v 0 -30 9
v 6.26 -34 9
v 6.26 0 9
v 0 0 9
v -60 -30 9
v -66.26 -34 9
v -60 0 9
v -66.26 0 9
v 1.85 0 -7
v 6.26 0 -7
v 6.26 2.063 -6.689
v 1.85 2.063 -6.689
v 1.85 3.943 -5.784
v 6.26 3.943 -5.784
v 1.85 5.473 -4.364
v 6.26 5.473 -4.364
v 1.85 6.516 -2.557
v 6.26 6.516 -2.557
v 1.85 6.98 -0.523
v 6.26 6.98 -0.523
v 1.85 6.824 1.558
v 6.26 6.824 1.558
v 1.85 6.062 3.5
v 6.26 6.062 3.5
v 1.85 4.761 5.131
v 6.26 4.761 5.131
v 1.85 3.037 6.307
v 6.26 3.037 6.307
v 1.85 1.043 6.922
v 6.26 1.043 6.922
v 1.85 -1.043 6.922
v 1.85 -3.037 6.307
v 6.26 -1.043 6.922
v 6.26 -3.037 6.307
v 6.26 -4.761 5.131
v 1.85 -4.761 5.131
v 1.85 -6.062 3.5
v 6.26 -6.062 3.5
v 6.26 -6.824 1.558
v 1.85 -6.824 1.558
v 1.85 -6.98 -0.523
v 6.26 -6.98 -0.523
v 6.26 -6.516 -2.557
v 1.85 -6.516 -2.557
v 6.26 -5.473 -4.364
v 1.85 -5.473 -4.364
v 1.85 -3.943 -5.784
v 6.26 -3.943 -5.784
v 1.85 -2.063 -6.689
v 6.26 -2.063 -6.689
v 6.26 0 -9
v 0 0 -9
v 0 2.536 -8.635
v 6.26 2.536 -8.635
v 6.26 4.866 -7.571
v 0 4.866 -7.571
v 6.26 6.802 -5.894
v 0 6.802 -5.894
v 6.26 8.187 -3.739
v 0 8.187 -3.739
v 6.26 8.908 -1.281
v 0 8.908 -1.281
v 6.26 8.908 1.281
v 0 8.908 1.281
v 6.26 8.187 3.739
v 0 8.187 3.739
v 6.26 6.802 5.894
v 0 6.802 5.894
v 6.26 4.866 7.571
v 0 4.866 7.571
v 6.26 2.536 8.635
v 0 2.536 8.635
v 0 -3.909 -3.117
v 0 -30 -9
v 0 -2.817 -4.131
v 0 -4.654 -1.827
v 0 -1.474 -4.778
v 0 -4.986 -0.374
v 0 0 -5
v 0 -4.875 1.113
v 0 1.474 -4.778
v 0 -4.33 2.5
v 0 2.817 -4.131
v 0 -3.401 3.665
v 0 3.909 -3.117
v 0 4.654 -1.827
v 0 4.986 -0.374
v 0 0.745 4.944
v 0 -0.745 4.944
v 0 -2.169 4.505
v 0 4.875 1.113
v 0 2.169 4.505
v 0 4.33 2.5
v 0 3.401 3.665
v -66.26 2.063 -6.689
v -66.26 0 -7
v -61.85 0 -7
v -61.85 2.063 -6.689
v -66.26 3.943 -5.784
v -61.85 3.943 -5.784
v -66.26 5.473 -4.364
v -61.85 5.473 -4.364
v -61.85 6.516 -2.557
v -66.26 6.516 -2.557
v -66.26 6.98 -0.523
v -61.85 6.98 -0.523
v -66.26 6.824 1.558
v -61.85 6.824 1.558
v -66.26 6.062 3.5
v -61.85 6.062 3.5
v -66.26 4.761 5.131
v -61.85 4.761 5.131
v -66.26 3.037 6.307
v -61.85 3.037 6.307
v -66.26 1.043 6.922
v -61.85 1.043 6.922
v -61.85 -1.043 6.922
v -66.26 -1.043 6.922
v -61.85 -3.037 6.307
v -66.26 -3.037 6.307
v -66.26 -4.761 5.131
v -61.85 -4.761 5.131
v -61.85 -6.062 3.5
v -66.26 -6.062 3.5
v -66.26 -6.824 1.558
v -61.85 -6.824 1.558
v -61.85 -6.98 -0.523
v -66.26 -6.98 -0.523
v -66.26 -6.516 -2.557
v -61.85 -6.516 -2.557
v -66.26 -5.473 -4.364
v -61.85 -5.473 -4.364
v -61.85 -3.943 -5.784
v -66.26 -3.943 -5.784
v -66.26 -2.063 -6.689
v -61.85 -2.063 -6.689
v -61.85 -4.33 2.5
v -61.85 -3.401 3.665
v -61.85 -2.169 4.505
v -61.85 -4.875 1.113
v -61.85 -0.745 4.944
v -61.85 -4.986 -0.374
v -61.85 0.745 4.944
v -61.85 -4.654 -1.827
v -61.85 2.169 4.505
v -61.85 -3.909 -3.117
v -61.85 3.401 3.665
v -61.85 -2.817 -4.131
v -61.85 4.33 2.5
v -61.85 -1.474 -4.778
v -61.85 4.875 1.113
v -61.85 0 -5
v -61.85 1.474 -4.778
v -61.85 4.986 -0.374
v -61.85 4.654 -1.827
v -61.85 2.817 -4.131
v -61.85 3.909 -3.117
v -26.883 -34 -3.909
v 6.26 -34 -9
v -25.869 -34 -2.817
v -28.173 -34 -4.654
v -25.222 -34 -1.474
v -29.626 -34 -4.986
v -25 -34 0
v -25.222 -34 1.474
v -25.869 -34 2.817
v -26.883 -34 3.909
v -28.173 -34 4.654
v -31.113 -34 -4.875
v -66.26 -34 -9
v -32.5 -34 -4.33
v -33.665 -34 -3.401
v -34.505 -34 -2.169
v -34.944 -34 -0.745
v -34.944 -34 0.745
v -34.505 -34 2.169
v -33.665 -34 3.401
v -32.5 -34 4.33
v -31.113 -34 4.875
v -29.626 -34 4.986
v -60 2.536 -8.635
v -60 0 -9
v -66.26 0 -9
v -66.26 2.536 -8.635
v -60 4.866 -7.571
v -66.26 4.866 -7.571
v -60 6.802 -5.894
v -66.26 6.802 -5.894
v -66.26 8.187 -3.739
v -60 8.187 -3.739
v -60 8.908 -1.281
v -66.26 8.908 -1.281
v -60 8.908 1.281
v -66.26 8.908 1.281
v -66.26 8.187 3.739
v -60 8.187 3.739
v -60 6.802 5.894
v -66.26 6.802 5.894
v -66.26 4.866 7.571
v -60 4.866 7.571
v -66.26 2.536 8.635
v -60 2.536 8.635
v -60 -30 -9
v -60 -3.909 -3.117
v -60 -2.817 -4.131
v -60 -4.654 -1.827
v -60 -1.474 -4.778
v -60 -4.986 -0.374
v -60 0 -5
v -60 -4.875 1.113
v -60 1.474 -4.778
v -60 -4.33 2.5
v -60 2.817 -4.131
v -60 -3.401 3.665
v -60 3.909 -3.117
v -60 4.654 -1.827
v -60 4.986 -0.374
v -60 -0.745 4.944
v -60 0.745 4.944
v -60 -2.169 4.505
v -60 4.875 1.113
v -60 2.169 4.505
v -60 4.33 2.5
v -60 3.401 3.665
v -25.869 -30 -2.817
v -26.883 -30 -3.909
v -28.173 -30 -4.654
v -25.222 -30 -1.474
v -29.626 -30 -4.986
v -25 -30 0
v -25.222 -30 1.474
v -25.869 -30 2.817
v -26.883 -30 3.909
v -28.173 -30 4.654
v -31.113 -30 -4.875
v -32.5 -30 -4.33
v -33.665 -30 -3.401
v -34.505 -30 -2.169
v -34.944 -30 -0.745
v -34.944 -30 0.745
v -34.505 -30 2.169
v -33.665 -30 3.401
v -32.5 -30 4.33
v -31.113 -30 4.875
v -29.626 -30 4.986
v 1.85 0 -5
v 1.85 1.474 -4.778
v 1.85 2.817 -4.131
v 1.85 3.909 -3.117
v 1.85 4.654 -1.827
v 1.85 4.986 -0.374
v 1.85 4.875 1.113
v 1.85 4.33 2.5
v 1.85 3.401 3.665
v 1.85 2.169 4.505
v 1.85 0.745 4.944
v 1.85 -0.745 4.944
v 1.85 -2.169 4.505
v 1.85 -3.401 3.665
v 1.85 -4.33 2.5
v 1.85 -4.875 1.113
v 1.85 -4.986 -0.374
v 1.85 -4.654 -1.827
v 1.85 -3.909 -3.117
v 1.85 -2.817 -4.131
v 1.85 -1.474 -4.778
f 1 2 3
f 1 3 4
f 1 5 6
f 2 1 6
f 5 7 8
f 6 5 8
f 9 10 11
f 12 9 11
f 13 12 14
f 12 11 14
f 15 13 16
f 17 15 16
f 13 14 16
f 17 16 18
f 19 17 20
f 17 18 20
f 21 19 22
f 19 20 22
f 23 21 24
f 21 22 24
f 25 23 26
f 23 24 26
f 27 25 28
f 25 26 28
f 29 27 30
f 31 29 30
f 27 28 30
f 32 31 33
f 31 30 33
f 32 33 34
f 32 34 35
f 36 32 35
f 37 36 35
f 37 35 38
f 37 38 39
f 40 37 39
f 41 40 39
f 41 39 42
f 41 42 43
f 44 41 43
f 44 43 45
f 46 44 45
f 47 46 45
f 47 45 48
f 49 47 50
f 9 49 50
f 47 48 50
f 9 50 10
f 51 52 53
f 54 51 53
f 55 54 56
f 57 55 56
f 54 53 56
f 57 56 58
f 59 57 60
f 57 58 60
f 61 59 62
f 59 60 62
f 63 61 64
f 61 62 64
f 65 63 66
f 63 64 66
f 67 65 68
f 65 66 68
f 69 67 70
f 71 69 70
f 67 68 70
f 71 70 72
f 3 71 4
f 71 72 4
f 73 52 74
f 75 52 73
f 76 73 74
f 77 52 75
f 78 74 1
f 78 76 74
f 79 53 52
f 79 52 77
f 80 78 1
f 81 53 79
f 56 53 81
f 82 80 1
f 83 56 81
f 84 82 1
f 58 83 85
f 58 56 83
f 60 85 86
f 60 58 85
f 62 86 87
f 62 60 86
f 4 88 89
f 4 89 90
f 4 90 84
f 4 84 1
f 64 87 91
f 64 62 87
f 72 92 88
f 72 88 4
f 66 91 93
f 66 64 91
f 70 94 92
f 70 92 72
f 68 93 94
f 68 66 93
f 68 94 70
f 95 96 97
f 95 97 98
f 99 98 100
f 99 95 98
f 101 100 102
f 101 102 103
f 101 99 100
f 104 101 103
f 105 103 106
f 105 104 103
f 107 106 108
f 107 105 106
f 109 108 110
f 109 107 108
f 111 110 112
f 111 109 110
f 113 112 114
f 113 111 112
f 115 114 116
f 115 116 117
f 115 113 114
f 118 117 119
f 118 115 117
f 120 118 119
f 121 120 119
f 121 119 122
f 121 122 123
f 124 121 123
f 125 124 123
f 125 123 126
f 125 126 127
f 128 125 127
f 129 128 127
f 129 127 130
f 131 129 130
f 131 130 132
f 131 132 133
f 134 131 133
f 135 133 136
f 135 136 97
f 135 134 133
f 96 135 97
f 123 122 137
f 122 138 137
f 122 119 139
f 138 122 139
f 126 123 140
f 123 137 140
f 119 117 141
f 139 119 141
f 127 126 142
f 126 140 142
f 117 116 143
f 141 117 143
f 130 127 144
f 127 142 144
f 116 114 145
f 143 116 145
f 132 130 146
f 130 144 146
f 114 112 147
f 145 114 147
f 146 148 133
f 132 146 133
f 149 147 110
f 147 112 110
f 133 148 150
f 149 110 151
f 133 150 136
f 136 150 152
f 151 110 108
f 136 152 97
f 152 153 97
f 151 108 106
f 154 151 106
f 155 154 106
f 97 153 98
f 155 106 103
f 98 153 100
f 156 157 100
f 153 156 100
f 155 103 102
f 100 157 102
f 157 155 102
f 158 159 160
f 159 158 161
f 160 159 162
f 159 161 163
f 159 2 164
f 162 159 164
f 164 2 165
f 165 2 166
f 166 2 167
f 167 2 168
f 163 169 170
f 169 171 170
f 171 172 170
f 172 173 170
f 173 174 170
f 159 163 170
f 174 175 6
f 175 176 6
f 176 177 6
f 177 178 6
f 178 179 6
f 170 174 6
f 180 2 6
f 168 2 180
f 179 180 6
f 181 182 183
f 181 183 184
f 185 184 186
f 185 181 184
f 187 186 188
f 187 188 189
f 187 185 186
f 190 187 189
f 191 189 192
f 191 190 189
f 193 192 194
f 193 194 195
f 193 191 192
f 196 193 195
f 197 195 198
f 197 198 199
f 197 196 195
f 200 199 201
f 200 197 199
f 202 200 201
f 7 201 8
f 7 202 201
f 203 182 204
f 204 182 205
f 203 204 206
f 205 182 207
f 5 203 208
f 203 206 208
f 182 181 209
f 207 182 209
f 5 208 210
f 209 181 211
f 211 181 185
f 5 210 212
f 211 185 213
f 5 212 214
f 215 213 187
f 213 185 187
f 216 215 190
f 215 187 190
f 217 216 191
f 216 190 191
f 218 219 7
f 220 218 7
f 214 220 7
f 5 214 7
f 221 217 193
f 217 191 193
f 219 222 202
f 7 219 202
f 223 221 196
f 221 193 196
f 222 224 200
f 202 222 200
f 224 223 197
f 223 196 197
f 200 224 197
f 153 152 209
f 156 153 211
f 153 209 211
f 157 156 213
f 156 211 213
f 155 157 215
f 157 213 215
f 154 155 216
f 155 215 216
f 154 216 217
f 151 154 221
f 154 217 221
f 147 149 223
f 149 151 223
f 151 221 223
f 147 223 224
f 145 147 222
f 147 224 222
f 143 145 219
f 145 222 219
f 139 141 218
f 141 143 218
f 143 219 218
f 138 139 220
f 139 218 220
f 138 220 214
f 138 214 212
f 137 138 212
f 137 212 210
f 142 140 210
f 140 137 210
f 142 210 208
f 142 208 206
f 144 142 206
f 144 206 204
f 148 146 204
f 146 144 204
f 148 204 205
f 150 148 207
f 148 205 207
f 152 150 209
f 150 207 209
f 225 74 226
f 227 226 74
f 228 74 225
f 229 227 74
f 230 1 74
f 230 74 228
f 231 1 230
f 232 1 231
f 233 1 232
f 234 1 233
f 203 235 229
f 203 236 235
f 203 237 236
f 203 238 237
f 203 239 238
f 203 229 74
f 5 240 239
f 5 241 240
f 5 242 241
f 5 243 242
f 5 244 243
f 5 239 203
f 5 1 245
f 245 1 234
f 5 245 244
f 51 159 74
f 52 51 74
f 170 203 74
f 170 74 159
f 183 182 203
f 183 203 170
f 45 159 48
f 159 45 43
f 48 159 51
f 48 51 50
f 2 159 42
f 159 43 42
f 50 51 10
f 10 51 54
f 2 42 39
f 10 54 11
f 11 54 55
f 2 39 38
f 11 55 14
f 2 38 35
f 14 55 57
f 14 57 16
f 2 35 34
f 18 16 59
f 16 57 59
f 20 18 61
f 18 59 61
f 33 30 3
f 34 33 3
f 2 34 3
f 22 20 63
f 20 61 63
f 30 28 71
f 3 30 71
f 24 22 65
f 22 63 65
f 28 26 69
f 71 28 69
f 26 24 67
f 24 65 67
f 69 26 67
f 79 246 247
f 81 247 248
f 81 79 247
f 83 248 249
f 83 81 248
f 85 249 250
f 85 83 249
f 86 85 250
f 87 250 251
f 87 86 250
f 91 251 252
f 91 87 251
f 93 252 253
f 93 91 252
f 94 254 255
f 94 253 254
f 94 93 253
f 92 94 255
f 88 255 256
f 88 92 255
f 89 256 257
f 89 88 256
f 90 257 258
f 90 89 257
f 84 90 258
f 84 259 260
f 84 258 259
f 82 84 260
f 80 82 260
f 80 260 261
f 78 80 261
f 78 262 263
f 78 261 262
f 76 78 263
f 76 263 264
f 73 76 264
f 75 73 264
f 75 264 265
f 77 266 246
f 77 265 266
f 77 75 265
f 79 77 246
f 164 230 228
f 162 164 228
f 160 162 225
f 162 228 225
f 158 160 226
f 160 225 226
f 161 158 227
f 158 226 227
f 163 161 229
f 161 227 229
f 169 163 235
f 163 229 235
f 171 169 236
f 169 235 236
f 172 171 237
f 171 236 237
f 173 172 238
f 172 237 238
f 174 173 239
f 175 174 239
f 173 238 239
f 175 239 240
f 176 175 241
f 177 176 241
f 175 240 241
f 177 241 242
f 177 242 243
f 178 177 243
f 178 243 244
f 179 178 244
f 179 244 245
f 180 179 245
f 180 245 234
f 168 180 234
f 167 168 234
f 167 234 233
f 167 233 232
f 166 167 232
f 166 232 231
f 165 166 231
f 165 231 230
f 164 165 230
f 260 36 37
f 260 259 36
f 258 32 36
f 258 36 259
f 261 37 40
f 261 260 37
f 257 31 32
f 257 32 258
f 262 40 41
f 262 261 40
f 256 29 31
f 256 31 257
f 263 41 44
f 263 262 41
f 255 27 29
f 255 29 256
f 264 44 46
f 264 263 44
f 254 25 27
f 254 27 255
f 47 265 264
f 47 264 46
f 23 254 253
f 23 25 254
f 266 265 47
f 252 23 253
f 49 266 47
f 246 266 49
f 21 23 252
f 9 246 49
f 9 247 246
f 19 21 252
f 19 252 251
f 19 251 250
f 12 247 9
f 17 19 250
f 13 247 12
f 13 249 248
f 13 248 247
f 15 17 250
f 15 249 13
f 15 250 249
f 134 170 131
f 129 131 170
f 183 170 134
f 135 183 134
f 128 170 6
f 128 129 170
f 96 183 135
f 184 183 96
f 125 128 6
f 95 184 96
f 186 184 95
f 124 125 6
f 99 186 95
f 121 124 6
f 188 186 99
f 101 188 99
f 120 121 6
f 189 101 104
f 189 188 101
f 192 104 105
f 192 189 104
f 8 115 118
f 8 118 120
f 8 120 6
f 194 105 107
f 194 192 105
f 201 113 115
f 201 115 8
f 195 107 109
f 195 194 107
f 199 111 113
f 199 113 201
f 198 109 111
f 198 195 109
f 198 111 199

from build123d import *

# Parameters (mm, degrees)
SKETCH1_R           = 9
SKETCH1_R_2         = 5
BOSS_EXTRUDE1_DEPTH = 6.26
BOSS_EXTRUDE2_DEPTH = 6.26
SKETCH2_R           = 7
CUT_EXTRUDE1_DEPTH  = 4.41
SKETCH4_W           = 36.26
SKETCH4_H           = 18
BOSS_EXTRUDE3_DEPTH = 4
SKETCH5_R           = 5
CUT_EXTRUDE2_DEPTH  = 5


with BuildPart() as part:
    # Sketch1 → Boss-Extrude1 (new body)
    with BuildSketch(Plane(origin=(0, 0, 0), x_dir=(0, 0, -1), z_dir=(1, 0, 0))):
        Circle(SKETCH1_R)
        Circle(SKETCH1_R_2, mode=Mode.SUBTRACT)
    extrude(amount=BOSS_EXTRUDE1_DEPTH)

    # Sketch3 → Boss-Extrude2 (add)
    with BuildSketch(Plane.ZY):
        with BuildLine():
            Line((-9, 0), (-9, -30))
            Line((-9, -30), (9, -30))
            Line((9, -30), (9, 0))
            Line((9, 0), (5, 0))
            ThreePointArc((5, 0), (0, -5), (-5, 0))
            Line((-5, 0), (-9, 0))
        make_face()
    extrude(amount=-BOSS_EXTRUDE2_DEPTH)

    # Sketch2 → Cut-Extrude1 (cut)
    with BuildSketch(Plane(origin=(6.26, 0, 0), x_dir=(0, 0, -1), z_dir=(1, 0, 0))):
        Circle(SKETCH2_R)
    extrude(amount=-CUT_EXTRUDE1_DEPTH, mode=Mode.SUBTRACT)

    # Sketch4 → Boss-Extrude3 (add)
    with BuildSketch(Plane.XZ.offset(30)):
        with Locations((-11.87, 0)):
            Rectangle(SKETCH4_W, SKETCH4_H)
    extrude(amount=BOSS_EXTRUDE3_DEPTH)

    # Mirror2: part across plane


with BuildPart() as part_1:
    add(part.part)
    add(part.part.mirror(Plane(origin=(-30, -34, 9), x_dir=(0, 0, 1), z_dir=(1, 0, 0))))

    # Sketch5 → Cut-Extrude2 (cut, through all)
    with BuildSketch(Plane(origin=(0, -30, 0), x_dir=(1, 0, 0), z_dir=(0, 1, 0))):
        with Locations((-30, 0)):
            Circle(SKETCH5_R)
    extrude(amount=-CUT_EXTRUDE2_DEPTH, mode=Mode.SUBTRACT)


solid = part_1.part
